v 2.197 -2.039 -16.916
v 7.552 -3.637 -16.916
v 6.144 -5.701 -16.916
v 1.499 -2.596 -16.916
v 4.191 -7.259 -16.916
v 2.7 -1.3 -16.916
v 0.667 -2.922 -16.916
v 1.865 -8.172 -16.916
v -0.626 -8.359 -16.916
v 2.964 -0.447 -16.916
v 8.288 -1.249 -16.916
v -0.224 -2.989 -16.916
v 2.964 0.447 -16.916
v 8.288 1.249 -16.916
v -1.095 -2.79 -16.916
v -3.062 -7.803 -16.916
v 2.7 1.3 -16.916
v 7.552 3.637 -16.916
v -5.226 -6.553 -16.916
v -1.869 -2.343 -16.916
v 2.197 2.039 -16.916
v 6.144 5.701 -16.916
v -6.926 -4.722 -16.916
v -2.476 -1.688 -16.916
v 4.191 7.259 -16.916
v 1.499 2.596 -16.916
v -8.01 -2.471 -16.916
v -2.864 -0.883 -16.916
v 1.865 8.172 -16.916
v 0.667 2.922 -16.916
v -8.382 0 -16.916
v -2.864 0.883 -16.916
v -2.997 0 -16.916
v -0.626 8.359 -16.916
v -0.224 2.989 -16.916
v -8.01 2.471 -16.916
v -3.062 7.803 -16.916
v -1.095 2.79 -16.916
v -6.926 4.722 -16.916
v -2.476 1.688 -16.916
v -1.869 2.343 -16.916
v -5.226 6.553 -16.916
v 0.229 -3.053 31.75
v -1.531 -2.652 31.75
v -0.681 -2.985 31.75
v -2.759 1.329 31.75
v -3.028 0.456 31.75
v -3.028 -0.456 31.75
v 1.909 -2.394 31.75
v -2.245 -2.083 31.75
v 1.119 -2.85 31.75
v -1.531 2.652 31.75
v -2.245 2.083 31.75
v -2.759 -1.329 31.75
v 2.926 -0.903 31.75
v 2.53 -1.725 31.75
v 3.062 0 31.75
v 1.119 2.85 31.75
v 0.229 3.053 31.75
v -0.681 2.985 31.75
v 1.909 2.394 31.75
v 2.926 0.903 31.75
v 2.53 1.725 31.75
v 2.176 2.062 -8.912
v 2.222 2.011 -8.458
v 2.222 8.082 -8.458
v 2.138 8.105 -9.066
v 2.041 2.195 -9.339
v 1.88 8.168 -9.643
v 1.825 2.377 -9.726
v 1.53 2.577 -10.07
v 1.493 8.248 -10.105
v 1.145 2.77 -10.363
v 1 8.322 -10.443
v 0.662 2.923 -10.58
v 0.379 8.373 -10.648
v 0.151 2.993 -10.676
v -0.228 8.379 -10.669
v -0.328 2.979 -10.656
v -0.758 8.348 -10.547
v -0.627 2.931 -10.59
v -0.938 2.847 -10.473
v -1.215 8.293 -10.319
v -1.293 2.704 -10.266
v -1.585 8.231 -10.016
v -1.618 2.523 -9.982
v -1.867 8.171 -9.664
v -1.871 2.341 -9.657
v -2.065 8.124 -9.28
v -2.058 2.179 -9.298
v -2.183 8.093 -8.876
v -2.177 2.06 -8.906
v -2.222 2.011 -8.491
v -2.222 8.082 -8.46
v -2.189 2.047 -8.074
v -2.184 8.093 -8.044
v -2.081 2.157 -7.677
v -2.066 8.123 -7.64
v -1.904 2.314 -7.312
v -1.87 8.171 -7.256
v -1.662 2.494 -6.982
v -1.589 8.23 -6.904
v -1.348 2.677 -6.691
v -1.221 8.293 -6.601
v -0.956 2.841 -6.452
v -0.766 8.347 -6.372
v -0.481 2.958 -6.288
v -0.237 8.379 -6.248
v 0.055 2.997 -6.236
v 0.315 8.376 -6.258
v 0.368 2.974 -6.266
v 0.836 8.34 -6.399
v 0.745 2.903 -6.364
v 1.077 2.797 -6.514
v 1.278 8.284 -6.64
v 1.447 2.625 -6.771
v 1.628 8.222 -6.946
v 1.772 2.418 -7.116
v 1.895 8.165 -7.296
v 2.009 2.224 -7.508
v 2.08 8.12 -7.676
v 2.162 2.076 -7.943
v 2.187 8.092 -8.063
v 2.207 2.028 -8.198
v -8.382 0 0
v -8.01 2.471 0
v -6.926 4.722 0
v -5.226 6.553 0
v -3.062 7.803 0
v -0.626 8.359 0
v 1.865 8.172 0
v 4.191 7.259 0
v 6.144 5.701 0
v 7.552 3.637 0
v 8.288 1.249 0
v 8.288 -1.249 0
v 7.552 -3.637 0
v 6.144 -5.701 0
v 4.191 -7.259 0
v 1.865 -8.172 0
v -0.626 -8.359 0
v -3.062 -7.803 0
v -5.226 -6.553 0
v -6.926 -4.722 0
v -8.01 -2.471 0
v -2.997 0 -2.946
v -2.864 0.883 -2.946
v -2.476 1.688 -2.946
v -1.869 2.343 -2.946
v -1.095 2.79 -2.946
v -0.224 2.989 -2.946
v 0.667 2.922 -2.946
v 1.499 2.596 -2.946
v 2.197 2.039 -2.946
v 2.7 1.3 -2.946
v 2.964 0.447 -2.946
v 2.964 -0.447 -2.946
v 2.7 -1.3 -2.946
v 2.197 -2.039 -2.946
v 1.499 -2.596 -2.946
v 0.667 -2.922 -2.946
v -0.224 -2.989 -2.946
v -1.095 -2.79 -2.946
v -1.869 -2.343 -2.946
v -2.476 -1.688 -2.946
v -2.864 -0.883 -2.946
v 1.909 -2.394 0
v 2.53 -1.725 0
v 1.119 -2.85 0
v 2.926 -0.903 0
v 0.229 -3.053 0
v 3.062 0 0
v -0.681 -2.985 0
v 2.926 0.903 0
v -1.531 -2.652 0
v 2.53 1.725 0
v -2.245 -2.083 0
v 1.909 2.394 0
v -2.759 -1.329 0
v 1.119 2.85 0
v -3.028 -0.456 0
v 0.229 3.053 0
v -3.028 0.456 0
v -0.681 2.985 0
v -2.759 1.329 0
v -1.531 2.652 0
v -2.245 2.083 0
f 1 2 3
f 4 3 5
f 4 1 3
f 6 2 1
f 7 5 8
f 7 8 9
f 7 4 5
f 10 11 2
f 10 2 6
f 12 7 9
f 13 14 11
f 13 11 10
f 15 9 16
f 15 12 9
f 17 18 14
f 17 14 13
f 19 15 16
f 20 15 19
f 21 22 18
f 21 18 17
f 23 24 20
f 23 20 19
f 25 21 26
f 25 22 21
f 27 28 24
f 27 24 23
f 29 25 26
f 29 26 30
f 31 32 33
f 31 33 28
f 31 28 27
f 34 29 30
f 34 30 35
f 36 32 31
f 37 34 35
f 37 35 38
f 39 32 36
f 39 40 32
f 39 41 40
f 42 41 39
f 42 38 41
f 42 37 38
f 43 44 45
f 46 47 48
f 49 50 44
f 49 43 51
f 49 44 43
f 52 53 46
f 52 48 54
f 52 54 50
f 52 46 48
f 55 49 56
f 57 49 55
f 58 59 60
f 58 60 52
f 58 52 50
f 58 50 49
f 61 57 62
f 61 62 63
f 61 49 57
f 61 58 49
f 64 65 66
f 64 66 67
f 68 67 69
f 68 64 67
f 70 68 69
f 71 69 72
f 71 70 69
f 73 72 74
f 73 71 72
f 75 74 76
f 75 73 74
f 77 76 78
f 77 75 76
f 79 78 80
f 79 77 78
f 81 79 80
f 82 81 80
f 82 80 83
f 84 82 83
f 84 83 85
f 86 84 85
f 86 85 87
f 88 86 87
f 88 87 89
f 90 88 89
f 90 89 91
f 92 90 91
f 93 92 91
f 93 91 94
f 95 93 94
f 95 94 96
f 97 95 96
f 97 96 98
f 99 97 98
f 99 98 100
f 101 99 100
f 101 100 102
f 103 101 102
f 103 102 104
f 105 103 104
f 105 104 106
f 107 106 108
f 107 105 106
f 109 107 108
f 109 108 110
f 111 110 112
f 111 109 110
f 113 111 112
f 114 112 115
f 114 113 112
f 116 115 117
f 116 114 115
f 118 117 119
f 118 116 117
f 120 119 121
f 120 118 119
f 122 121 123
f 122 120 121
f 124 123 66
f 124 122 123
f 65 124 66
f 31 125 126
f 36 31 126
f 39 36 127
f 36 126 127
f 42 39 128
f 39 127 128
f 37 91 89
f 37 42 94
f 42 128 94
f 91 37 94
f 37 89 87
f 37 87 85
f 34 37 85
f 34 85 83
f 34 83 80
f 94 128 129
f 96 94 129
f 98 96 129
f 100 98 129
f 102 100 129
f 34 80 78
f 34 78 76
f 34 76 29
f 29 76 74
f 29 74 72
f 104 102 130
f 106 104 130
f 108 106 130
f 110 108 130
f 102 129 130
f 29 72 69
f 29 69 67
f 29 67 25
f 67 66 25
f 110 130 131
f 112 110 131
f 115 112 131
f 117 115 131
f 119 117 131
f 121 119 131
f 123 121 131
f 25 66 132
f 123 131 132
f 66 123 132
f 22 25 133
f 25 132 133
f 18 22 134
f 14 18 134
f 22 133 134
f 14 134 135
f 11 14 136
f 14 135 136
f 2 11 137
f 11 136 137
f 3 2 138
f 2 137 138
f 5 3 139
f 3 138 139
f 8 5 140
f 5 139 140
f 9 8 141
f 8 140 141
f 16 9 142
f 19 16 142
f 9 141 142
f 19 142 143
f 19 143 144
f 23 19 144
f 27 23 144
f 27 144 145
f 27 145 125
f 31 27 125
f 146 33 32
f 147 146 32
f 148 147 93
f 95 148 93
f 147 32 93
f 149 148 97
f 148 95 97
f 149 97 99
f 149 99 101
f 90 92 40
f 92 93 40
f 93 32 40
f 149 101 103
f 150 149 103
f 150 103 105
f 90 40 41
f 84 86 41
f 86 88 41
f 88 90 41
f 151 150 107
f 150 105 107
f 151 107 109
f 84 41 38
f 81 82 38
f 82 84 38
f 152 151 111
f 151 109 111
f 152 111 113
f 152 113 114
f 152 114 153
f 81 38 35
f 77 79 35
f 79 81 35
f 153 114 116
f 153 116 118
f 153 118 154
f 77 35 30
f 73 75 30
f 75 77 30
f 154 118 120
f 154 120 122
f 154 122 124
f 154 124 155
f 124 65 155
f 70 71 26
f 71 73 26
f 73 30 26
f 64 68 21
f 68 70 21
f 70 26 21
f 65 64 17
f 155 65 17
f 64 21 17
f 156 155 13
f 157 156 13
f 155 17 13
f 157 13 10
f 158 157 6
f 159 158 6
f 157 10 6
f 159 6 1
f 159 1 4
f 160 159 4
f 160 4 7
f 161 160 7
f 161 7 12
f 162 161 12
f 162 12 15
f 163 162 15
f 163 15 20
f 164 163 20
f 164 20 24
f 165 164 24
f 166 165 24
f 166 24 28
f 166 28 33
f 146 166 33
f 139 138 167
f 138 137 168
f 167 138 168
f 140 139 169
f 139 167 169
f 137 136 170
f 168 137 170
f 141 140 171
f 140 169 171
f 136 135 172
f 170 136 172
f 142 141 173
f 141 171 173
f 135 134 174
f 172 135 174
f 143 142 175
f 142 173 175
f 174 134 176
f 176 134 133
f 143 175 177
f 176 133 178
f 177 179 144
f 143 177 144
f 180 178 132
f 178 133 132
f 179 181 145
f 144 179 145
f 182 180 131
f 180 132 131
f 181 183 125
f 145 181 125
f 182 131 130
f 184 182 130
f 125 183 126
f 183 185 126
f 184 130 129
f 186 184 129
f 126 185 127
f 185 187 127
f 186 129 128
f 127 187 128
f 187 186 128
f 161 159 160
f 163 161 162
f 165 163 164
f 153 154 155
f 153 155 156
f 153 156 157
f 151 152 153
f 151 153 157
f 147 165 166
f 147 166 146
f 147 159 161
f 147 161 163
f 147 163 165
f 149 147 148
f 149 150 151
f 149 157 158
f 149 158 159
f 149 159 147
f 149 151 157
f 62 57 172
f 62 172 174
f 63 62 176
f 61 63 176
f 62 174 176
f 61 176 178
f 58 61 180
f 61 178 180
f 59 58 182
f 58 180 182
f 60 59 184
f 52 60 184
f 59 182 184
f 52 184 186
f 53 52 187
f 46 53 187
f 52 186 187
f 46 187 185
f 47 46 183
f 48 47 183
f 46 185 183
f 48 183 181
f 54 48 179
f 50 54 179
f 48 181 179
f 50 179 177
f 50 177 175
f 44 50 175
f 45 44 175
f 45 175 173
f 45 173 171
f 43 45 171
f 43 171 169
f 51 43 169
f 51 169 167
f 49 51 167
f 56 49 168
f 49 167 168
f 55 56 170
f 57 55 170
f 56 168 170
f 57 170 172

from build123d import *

# Parameters (mm, degrees)
SKETCH2_R           = 3.06197
BOSS_EXTRUDE1_DEPTH = 31.75
SKETCH3_R           = 8.382
BOSS_EXTRUDE2_DEPTH = 16.9164
SKETCH4_R           = 2.9972
CUT_EXTRUDE1_DEPTH  = 13.97
SKETCH5_R           = 2.2225
CUT_EXTRUDE2_DEPTH  = 13.97


with BuildPart() as part:
    # Sketch2 → Boss-Extrude1 (new body)
    with BuildSketch(Plane.XY):
        Circle(SKETCH2_R)
    extrude(amount=BOSS_EXTRUDE1_DEPTH)

    # Sketch3 → Boss-Extrude2 (add)
    with BuildSketch(Plane(origin=(0, 0, 0), x_dir=(-1, 0, 0), z_dir=(0, 0, -1))):
        Circle(SKETCH3_R)
    extrude(amount=BOSS_EXTRUDE2_DEPTH)

    # Sketch4 → Cut-Extrude1 (cut)
    with BuildSketch(Plane(origin=(0, 0, -16.9164), x_dir=(-1, 0, 0), z_dir=(0, 0, -1))):
        Circle(SKETCH4_R)
    extrude(amount=-CUT_EXTRUDE1_DEPTH, mode=Mode.SUBTRACT)

    # Sketch5 → Cut-Extrude2 (cut)
    with BuildSketch(Plane(origin=(0, 0, 0), x_dir=(1, 0, 0), z_dir=(0, 1, 0))):
        with Locations((0, 8.4582)):
            Circle(SKETCH5_R)
    extrude(amount=CUT_EXTRUDE2_DEPTH, mode=Mode.SUBTRACT)


solid = part.part
